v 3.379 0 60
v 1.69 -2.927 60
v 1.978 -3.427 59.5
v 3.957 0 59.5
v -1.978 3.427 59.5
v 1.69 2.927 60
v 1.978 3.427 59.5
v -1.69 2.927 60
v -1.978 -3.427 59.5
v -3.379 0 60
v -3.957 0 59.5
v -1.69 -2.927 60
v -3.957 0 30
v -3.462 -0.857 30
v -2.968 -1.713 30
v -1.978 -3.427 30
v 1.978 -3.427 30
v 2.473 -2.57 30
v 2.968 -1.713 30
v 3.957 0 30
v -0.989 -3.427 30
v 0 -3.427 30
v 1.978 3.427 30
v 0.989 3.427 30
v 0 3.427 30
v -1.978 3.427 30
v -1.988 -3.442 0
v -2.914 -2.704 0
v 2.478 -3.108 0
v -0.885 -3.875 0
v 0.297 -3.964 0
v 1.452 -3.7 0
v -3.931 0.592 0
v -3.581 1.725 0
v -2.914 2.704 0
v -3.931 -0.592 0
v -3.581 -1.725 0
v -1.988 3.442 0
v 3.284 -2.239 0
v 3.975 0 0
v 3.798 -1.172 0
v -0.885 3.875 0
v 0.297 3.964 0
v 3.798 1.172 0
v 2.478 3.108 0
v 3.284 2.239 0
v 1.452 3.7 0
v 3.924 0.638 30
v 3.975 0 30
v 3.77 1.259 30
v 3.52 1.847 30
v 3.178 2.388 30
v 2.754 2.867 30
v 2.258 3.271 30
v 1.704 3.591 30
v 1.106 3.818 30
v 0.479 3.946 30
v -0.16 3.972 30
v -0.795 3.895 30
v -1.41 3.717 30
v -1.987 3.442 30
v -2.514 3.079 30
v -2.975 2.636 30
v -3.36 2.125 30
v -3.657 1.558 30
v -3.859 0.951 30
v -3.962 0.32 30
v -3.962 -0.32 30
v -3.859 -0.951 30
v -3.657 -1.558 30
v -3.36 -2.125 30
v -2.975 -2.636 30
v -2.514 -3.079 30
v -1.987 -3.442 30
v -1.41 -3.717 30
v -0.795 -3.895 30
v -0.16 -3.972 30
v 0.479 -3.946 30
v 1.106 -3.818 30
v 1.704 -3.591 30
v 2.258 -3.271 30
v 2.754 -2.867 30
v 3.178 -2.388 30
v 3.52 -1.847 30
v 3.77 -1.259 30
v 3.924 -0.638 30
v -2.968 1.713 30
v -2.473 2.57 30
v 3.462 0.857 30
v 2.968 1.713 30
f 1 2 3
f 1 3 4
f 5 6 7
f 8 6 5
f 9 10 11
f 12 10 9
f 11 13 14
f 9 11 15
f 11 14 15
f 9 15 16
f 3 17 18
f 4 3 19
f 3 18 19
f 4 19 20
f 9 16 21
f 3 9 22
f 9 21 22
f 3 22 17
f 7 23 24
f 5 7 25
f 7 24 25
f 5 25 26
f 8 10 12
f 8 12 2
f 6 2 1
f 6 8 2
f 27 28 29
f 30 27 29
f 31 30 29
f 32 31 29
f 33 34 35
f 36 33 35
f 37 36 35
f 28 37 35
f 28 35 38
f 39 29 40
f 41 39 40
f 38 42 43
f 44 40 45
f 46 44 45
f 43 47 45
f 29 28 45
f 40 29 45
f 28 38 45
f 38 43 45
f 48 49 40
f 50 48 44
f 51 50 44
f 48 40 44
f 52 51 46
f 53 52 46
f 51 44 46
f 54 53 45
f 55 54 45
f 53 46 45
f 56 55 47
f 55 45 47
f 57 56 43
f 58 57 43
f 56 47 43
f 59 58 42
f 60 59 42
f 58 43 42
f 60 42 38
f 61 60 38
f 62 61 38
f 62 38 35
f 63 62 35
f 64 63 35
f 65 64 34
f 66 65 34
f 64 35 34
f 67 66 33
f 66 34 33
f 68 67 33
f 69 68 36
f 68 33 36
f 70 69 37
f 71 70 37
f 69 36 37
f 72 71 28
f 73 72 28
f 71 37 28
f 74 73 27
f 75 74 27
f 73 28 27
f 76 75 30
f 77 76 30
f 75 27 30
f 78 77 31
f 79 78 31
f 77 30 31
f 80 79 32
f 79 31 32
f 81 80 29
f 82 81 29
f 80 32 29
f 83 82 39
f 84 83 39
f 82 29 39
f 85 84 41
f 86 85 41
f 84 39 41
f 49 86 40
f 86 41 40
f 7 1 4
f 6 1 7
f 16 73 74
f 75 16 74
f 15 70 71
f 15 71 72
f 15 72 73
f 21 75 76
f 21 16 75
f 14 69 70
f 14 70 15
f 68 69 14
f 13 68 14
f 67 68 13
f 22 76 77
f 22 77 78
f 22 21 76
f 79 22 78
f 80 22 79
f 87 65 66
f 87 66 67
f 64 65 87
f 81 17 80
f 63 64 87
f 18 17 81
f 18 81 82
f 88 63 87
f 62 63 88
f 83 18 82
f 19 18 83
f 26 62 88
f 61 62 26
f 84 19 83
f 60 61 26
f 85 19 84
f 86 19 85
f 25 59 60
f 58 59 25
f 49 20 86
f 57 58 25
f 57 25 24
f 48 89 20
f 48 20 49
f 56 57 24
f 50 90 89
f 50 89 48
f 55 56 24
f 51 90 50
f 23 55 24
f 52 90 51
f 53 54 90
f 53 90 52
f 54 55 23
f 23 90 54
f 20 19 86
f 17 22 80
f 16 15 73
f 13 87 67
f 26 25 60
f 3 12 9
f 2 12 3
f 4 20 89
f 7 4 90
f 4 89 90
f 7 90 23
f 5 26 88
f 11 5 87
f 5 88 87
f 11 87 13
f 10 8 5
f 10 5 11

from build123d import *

# Parameters (mm, degrees)
SKETCH1_R           = 3.975
BOSS_EXTRUDE1_DEPTH = 30
BOSS_EXTRUDE2_DEPTH = 30
CHAMFER2_SIZE       = 0.5


with BuildPart() as part:
    # Sketch1 → Boss-Extrude1 (new body)
    with BuildSketch(Plane.XY):
        Circle(SKETCH1_R)
    extrude(amount=BOSS_EXTRUDE1_DEPTH)

    # Sketch2 → Boss-Extrude2 (add)
    with BuildSketch(Plane.XY.offset(30)):
        Polygon((3.95669873, 0), (1.978349365, 3.426601615), (-1.978349365, 3.426601615), (-3.95669873, 0), (-1.978349365, -3.426601615), (1.978349365, -3.426601615), align=None)
    extrude(amount=BOSS_EXTRUDE2_DEPTH)

    # Chamfer2
    chamfer2_edges = [part.edges().sort_by_distance(p)[0] for p in [
        (2.967524047, -1.713300808, 60),
        (2.967524047, 1.713300808, 60),
        (0, 3.426601615, 60),
        (-2.967524047, 1.713300808, 60),
        (-2.967524047, -1.713300808, 60),
        (0, -3.426601615, 60),
    ]]
    chamfer(chamfer2_edges, length=CHAMFER2_SIZE)


solid = part.part
